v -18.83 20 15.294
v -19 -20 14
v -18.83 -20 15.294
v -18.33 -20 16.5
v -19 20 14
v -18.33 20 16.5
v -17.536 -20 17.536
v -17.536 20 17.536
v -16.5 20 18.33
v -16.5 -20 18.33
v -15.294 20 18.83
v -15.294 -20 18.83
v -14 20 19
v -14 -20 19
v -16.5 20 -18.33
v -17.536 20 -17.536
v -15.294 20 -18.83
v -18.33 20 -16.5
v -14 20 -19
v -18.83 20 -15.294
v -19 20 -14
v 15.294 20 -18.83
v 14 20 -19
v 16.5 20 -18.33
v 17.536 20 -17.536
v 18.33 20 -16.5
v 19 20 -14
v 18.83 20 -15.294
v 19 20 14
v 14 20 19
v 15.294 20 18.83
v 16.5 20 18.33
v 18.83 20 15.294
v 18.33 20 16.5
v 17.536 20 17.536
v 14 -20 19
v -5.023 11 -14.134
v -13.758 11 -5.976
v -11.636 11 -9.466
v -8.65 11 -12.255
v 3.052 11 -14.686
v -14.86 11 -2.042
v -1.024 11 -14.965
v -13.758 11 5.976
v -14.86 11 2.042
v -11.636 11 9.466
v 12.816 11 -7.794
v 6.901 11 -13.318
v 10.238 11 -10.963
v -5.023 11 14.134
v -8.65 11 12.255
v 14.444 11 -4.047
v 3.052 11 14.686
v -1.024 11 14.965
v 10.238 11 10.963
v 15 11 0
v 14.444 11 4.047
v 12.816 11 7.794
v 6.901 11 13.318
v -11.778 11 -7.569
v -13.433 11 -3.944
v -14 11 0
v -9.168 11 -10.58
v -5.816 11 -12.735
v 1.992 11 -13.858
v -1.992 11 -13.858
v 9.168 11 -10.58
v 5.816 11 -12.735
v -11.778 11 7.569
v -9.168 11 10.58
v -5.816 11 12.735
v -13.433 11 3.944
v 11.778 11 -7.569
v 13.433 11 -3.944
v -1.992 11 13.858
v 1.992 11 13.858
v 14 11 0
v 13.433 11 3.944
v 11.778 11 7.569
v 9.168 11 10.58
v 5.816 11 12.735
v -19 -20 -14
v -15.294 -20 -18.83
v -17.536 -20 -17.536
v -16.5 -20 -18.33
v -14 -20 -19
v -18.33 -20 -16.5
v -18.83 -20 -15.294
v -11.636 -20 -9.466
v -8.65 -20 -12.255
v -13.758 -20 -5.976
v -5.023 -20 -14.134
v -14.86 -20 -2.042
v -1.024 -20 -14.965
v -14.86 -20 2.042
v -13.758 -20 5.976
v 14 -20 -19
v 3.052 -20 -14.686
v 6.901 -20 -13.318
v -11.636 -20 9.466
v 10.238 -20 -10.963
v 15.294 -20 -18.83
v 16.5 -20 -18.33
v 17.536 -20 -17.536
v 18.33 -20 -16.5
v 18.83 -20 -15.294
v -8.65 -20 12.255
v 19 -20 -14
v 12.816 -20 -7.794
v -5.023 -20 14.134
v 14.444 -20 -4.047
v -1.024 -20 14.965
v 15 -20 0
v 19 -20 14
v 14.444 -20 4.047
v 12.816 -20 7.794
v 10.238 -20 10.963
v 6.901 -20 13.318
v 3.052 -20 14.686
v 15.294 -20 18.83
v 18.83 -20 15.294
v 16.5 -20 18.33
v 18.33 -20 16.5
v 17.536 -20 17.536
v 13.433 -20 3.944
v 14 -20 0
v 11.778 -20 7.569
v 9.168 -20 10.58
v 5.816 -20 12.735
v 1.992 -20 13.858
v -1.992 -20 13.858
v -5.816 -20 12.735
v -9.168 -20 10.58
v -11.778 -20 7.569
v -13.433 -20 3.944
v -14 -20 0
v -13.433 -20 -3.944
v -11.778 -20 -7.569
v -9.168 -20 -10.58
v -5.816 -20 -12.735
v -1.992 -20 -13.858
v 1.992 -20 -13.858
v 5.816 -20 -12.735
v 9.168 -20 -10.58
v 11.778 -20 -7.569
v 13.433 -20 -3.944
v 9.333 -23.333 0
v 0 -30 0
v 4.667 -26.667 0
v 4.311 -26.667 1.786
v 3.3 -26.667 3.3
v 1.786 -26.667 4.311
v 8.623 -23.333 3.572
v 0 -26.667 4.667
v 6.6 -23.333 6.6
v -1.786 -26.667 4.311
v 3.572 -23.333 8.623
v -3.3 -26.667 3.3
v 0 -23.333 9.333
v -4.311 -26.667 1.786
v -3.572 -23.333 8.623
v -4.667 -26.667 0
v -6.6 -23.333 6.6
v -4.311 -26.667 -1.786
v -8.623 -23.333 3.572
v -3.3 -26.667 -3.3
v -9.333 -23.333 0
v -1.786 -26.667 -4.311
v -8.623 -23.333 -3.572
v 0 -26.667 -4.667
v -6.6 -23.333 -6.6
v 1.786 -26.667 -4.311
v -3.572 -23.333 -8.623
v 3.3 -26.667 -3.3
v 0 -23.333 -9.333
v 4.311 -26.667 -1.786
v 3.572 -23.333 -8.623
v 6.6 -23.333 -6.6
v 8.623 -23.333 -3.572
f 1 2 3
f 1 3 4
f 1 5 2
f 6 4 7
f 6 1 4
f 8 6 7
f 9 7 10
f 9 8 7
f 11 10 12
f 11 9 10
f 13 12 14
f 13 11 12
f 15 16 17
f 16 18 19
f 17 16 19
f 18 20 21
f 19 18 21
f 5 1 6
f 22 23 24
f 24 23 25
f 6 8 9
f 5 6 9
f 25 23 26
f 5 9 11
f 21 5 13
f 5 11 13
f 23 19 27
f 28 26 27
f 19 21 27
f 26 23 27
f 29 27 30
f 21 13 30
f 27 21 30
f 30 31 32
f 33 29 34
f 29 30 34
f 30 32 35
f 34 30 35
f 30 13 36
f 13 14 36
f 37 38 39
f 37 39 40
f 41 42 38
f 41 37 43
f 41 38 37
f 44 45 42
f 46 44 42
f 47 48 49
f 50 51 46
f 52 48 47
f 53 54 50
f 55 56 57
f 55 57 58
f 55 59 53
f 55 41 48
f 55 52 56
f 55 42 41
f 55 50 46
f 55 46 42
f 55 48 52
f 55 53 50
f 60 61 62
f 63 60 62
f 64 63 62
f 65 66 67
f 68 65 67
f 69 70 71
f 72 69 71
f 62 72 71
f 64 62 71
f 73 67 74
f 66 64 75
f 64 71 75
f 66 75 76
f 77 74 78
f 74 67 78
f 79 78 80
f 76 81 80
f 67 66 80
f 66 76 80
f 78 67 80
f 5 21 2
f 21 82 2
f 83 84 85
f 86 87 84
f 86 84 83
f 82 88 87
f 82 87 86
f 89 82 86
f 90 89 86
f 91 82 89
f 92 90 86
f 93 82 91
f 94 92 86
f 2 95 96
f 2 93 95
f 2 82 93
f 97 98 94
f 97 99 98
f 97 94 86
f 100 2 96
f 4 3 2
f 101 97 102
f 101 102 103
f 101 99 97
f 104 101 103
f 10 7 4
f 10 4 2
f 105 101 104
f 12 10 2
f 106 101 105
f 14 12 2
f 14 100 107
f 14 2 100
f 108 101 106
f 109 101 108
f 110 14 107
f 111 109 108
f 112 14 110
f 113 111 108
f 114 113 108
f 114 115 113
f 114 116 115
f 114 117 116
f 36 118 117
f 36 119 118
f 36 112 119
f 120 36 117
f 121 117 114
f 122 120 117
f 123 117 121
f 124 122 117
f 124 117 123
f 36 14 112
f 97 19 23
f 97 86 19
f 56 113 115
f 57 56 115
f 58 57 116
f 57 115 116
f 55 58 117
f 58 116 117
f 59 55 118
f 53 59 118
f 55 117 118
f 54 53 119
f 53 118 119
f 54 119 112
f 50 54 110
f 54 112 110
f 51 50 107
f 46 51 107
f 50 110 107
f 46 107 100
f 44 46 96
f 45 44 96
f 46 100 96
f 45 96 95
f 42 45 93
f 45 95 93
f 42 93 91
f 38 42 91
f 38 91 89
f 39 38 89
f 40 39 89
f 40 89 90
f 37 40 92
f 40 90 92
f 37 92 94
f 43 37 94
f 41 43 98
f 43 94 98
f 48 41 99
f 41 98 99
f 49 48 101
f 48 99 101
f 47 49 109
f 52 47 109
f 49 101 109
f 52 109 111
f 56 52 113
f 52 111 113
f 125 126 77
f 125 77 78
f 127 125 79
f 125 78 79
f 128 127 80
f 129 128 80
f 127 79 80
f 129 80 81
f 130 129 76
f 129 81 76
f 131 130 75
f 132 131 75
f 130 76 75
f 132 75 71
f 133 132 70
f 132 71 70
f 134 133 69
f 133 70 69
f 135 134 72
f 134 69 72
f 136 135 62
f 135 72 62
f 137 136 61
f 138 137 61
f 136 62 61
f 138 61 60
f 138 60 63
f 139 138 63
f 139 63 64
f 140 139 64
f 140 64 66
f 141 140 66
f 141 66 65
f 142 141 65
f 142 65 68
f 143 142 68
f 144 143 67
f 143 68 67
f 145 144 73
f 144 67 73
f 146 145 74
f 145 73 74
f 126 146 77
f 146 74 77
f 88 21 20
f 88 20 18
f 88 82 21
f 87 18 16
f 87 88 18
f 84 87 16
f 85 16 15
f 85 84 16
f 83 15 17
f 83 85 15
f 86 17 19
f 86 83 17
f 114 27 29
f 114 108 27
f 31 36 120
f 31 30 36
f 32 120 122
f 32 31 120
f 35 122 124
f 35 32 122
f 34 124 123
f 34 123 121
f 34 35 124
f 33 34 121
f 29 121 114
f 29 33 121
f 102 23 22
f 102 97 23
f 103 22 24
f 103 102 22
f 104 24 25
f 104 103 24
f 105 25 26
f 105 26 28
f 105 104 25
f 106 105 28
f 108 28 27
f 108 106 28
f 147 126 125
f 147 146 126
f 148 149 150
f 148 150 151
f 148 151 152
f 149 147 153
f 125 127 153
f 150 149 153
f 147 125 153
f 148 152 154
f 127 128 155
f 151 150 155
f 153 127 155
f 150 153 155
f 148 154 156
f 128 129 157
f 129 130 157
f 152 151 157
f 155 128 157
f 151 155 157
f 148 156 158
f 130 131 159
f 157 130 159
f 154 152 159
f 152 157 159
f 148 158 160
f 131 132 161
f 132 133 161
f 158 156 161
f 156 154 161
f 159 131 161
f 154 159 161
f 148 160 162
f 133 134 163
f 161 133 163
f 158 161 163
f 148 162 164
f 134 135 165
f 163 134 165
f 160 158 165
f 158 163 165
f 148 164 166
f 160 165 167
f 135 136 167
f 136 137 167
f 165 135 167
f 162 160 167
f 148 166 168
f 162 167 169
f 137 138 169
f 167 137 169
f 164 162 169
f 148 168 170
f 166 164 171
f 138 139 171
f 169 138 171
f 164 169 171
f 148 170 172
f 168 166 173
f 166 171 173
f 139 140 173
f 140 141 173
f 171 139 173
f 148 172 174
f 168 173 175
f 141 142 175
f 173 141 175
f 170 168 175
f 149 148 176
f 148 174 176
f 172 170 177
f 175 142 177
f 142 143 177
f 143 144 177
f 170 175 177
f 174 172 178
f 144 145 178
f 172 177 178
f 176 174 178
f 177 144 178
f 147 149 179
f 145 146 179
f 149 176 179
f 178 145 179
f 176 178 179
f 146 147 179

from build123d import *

# Parameters (mm, degrees)
F0_W     = 38
F0_H     = 38
F1_DEPTH = 20
F2_R     = 15
F3_DEPTH = 31
F4_R     = 5
F5_R     = 14
F6_DEPTH = 31


with BuildPart() as f1:
    # F0 (on Front) → F1 (new body, symmetric)
    with BuildSketch(Plane.XZ):
        Rectangle(F0_W, F0_H)
    extrude(amount=F1_DEPTH, both=True)

    # F2 (on face) → F3 (cut)
    with BuildSketch(Plane.XZ.offset(20)):
        Circle(F2_R)
    extrude(amount=-F3_DEPTH, mode=Mode.SUBTRACT)

    # F4
    f4_edges = [f1.edges().sort_by_distance(p)[0] for p in [
        (19, 0, -19),
        (19, 0, 19),
        (-19, 0, -19),
        (-19, 0, 19),
    ]]
    fillet(f4_edges, radius=F4_R)


with BuildPart() as f6:
    # F5 (on face) → F6 (new body, through all)
    with BuildSketch(Plane.XZ.offset(-11)):
        Circle(F5_R)
    extrude(amount=F6_DEPTH)

    # F7 (on Top) → F8 (revolve)
    with BuildSketch(Plane.XY):
        Polygon((0, -30), (14, -20), (0, -20), align=None)
    revolve(axis=Axis((0, -20, 0), (0, -1, 0)))


solid = Compound([f1.part, f6.part])
